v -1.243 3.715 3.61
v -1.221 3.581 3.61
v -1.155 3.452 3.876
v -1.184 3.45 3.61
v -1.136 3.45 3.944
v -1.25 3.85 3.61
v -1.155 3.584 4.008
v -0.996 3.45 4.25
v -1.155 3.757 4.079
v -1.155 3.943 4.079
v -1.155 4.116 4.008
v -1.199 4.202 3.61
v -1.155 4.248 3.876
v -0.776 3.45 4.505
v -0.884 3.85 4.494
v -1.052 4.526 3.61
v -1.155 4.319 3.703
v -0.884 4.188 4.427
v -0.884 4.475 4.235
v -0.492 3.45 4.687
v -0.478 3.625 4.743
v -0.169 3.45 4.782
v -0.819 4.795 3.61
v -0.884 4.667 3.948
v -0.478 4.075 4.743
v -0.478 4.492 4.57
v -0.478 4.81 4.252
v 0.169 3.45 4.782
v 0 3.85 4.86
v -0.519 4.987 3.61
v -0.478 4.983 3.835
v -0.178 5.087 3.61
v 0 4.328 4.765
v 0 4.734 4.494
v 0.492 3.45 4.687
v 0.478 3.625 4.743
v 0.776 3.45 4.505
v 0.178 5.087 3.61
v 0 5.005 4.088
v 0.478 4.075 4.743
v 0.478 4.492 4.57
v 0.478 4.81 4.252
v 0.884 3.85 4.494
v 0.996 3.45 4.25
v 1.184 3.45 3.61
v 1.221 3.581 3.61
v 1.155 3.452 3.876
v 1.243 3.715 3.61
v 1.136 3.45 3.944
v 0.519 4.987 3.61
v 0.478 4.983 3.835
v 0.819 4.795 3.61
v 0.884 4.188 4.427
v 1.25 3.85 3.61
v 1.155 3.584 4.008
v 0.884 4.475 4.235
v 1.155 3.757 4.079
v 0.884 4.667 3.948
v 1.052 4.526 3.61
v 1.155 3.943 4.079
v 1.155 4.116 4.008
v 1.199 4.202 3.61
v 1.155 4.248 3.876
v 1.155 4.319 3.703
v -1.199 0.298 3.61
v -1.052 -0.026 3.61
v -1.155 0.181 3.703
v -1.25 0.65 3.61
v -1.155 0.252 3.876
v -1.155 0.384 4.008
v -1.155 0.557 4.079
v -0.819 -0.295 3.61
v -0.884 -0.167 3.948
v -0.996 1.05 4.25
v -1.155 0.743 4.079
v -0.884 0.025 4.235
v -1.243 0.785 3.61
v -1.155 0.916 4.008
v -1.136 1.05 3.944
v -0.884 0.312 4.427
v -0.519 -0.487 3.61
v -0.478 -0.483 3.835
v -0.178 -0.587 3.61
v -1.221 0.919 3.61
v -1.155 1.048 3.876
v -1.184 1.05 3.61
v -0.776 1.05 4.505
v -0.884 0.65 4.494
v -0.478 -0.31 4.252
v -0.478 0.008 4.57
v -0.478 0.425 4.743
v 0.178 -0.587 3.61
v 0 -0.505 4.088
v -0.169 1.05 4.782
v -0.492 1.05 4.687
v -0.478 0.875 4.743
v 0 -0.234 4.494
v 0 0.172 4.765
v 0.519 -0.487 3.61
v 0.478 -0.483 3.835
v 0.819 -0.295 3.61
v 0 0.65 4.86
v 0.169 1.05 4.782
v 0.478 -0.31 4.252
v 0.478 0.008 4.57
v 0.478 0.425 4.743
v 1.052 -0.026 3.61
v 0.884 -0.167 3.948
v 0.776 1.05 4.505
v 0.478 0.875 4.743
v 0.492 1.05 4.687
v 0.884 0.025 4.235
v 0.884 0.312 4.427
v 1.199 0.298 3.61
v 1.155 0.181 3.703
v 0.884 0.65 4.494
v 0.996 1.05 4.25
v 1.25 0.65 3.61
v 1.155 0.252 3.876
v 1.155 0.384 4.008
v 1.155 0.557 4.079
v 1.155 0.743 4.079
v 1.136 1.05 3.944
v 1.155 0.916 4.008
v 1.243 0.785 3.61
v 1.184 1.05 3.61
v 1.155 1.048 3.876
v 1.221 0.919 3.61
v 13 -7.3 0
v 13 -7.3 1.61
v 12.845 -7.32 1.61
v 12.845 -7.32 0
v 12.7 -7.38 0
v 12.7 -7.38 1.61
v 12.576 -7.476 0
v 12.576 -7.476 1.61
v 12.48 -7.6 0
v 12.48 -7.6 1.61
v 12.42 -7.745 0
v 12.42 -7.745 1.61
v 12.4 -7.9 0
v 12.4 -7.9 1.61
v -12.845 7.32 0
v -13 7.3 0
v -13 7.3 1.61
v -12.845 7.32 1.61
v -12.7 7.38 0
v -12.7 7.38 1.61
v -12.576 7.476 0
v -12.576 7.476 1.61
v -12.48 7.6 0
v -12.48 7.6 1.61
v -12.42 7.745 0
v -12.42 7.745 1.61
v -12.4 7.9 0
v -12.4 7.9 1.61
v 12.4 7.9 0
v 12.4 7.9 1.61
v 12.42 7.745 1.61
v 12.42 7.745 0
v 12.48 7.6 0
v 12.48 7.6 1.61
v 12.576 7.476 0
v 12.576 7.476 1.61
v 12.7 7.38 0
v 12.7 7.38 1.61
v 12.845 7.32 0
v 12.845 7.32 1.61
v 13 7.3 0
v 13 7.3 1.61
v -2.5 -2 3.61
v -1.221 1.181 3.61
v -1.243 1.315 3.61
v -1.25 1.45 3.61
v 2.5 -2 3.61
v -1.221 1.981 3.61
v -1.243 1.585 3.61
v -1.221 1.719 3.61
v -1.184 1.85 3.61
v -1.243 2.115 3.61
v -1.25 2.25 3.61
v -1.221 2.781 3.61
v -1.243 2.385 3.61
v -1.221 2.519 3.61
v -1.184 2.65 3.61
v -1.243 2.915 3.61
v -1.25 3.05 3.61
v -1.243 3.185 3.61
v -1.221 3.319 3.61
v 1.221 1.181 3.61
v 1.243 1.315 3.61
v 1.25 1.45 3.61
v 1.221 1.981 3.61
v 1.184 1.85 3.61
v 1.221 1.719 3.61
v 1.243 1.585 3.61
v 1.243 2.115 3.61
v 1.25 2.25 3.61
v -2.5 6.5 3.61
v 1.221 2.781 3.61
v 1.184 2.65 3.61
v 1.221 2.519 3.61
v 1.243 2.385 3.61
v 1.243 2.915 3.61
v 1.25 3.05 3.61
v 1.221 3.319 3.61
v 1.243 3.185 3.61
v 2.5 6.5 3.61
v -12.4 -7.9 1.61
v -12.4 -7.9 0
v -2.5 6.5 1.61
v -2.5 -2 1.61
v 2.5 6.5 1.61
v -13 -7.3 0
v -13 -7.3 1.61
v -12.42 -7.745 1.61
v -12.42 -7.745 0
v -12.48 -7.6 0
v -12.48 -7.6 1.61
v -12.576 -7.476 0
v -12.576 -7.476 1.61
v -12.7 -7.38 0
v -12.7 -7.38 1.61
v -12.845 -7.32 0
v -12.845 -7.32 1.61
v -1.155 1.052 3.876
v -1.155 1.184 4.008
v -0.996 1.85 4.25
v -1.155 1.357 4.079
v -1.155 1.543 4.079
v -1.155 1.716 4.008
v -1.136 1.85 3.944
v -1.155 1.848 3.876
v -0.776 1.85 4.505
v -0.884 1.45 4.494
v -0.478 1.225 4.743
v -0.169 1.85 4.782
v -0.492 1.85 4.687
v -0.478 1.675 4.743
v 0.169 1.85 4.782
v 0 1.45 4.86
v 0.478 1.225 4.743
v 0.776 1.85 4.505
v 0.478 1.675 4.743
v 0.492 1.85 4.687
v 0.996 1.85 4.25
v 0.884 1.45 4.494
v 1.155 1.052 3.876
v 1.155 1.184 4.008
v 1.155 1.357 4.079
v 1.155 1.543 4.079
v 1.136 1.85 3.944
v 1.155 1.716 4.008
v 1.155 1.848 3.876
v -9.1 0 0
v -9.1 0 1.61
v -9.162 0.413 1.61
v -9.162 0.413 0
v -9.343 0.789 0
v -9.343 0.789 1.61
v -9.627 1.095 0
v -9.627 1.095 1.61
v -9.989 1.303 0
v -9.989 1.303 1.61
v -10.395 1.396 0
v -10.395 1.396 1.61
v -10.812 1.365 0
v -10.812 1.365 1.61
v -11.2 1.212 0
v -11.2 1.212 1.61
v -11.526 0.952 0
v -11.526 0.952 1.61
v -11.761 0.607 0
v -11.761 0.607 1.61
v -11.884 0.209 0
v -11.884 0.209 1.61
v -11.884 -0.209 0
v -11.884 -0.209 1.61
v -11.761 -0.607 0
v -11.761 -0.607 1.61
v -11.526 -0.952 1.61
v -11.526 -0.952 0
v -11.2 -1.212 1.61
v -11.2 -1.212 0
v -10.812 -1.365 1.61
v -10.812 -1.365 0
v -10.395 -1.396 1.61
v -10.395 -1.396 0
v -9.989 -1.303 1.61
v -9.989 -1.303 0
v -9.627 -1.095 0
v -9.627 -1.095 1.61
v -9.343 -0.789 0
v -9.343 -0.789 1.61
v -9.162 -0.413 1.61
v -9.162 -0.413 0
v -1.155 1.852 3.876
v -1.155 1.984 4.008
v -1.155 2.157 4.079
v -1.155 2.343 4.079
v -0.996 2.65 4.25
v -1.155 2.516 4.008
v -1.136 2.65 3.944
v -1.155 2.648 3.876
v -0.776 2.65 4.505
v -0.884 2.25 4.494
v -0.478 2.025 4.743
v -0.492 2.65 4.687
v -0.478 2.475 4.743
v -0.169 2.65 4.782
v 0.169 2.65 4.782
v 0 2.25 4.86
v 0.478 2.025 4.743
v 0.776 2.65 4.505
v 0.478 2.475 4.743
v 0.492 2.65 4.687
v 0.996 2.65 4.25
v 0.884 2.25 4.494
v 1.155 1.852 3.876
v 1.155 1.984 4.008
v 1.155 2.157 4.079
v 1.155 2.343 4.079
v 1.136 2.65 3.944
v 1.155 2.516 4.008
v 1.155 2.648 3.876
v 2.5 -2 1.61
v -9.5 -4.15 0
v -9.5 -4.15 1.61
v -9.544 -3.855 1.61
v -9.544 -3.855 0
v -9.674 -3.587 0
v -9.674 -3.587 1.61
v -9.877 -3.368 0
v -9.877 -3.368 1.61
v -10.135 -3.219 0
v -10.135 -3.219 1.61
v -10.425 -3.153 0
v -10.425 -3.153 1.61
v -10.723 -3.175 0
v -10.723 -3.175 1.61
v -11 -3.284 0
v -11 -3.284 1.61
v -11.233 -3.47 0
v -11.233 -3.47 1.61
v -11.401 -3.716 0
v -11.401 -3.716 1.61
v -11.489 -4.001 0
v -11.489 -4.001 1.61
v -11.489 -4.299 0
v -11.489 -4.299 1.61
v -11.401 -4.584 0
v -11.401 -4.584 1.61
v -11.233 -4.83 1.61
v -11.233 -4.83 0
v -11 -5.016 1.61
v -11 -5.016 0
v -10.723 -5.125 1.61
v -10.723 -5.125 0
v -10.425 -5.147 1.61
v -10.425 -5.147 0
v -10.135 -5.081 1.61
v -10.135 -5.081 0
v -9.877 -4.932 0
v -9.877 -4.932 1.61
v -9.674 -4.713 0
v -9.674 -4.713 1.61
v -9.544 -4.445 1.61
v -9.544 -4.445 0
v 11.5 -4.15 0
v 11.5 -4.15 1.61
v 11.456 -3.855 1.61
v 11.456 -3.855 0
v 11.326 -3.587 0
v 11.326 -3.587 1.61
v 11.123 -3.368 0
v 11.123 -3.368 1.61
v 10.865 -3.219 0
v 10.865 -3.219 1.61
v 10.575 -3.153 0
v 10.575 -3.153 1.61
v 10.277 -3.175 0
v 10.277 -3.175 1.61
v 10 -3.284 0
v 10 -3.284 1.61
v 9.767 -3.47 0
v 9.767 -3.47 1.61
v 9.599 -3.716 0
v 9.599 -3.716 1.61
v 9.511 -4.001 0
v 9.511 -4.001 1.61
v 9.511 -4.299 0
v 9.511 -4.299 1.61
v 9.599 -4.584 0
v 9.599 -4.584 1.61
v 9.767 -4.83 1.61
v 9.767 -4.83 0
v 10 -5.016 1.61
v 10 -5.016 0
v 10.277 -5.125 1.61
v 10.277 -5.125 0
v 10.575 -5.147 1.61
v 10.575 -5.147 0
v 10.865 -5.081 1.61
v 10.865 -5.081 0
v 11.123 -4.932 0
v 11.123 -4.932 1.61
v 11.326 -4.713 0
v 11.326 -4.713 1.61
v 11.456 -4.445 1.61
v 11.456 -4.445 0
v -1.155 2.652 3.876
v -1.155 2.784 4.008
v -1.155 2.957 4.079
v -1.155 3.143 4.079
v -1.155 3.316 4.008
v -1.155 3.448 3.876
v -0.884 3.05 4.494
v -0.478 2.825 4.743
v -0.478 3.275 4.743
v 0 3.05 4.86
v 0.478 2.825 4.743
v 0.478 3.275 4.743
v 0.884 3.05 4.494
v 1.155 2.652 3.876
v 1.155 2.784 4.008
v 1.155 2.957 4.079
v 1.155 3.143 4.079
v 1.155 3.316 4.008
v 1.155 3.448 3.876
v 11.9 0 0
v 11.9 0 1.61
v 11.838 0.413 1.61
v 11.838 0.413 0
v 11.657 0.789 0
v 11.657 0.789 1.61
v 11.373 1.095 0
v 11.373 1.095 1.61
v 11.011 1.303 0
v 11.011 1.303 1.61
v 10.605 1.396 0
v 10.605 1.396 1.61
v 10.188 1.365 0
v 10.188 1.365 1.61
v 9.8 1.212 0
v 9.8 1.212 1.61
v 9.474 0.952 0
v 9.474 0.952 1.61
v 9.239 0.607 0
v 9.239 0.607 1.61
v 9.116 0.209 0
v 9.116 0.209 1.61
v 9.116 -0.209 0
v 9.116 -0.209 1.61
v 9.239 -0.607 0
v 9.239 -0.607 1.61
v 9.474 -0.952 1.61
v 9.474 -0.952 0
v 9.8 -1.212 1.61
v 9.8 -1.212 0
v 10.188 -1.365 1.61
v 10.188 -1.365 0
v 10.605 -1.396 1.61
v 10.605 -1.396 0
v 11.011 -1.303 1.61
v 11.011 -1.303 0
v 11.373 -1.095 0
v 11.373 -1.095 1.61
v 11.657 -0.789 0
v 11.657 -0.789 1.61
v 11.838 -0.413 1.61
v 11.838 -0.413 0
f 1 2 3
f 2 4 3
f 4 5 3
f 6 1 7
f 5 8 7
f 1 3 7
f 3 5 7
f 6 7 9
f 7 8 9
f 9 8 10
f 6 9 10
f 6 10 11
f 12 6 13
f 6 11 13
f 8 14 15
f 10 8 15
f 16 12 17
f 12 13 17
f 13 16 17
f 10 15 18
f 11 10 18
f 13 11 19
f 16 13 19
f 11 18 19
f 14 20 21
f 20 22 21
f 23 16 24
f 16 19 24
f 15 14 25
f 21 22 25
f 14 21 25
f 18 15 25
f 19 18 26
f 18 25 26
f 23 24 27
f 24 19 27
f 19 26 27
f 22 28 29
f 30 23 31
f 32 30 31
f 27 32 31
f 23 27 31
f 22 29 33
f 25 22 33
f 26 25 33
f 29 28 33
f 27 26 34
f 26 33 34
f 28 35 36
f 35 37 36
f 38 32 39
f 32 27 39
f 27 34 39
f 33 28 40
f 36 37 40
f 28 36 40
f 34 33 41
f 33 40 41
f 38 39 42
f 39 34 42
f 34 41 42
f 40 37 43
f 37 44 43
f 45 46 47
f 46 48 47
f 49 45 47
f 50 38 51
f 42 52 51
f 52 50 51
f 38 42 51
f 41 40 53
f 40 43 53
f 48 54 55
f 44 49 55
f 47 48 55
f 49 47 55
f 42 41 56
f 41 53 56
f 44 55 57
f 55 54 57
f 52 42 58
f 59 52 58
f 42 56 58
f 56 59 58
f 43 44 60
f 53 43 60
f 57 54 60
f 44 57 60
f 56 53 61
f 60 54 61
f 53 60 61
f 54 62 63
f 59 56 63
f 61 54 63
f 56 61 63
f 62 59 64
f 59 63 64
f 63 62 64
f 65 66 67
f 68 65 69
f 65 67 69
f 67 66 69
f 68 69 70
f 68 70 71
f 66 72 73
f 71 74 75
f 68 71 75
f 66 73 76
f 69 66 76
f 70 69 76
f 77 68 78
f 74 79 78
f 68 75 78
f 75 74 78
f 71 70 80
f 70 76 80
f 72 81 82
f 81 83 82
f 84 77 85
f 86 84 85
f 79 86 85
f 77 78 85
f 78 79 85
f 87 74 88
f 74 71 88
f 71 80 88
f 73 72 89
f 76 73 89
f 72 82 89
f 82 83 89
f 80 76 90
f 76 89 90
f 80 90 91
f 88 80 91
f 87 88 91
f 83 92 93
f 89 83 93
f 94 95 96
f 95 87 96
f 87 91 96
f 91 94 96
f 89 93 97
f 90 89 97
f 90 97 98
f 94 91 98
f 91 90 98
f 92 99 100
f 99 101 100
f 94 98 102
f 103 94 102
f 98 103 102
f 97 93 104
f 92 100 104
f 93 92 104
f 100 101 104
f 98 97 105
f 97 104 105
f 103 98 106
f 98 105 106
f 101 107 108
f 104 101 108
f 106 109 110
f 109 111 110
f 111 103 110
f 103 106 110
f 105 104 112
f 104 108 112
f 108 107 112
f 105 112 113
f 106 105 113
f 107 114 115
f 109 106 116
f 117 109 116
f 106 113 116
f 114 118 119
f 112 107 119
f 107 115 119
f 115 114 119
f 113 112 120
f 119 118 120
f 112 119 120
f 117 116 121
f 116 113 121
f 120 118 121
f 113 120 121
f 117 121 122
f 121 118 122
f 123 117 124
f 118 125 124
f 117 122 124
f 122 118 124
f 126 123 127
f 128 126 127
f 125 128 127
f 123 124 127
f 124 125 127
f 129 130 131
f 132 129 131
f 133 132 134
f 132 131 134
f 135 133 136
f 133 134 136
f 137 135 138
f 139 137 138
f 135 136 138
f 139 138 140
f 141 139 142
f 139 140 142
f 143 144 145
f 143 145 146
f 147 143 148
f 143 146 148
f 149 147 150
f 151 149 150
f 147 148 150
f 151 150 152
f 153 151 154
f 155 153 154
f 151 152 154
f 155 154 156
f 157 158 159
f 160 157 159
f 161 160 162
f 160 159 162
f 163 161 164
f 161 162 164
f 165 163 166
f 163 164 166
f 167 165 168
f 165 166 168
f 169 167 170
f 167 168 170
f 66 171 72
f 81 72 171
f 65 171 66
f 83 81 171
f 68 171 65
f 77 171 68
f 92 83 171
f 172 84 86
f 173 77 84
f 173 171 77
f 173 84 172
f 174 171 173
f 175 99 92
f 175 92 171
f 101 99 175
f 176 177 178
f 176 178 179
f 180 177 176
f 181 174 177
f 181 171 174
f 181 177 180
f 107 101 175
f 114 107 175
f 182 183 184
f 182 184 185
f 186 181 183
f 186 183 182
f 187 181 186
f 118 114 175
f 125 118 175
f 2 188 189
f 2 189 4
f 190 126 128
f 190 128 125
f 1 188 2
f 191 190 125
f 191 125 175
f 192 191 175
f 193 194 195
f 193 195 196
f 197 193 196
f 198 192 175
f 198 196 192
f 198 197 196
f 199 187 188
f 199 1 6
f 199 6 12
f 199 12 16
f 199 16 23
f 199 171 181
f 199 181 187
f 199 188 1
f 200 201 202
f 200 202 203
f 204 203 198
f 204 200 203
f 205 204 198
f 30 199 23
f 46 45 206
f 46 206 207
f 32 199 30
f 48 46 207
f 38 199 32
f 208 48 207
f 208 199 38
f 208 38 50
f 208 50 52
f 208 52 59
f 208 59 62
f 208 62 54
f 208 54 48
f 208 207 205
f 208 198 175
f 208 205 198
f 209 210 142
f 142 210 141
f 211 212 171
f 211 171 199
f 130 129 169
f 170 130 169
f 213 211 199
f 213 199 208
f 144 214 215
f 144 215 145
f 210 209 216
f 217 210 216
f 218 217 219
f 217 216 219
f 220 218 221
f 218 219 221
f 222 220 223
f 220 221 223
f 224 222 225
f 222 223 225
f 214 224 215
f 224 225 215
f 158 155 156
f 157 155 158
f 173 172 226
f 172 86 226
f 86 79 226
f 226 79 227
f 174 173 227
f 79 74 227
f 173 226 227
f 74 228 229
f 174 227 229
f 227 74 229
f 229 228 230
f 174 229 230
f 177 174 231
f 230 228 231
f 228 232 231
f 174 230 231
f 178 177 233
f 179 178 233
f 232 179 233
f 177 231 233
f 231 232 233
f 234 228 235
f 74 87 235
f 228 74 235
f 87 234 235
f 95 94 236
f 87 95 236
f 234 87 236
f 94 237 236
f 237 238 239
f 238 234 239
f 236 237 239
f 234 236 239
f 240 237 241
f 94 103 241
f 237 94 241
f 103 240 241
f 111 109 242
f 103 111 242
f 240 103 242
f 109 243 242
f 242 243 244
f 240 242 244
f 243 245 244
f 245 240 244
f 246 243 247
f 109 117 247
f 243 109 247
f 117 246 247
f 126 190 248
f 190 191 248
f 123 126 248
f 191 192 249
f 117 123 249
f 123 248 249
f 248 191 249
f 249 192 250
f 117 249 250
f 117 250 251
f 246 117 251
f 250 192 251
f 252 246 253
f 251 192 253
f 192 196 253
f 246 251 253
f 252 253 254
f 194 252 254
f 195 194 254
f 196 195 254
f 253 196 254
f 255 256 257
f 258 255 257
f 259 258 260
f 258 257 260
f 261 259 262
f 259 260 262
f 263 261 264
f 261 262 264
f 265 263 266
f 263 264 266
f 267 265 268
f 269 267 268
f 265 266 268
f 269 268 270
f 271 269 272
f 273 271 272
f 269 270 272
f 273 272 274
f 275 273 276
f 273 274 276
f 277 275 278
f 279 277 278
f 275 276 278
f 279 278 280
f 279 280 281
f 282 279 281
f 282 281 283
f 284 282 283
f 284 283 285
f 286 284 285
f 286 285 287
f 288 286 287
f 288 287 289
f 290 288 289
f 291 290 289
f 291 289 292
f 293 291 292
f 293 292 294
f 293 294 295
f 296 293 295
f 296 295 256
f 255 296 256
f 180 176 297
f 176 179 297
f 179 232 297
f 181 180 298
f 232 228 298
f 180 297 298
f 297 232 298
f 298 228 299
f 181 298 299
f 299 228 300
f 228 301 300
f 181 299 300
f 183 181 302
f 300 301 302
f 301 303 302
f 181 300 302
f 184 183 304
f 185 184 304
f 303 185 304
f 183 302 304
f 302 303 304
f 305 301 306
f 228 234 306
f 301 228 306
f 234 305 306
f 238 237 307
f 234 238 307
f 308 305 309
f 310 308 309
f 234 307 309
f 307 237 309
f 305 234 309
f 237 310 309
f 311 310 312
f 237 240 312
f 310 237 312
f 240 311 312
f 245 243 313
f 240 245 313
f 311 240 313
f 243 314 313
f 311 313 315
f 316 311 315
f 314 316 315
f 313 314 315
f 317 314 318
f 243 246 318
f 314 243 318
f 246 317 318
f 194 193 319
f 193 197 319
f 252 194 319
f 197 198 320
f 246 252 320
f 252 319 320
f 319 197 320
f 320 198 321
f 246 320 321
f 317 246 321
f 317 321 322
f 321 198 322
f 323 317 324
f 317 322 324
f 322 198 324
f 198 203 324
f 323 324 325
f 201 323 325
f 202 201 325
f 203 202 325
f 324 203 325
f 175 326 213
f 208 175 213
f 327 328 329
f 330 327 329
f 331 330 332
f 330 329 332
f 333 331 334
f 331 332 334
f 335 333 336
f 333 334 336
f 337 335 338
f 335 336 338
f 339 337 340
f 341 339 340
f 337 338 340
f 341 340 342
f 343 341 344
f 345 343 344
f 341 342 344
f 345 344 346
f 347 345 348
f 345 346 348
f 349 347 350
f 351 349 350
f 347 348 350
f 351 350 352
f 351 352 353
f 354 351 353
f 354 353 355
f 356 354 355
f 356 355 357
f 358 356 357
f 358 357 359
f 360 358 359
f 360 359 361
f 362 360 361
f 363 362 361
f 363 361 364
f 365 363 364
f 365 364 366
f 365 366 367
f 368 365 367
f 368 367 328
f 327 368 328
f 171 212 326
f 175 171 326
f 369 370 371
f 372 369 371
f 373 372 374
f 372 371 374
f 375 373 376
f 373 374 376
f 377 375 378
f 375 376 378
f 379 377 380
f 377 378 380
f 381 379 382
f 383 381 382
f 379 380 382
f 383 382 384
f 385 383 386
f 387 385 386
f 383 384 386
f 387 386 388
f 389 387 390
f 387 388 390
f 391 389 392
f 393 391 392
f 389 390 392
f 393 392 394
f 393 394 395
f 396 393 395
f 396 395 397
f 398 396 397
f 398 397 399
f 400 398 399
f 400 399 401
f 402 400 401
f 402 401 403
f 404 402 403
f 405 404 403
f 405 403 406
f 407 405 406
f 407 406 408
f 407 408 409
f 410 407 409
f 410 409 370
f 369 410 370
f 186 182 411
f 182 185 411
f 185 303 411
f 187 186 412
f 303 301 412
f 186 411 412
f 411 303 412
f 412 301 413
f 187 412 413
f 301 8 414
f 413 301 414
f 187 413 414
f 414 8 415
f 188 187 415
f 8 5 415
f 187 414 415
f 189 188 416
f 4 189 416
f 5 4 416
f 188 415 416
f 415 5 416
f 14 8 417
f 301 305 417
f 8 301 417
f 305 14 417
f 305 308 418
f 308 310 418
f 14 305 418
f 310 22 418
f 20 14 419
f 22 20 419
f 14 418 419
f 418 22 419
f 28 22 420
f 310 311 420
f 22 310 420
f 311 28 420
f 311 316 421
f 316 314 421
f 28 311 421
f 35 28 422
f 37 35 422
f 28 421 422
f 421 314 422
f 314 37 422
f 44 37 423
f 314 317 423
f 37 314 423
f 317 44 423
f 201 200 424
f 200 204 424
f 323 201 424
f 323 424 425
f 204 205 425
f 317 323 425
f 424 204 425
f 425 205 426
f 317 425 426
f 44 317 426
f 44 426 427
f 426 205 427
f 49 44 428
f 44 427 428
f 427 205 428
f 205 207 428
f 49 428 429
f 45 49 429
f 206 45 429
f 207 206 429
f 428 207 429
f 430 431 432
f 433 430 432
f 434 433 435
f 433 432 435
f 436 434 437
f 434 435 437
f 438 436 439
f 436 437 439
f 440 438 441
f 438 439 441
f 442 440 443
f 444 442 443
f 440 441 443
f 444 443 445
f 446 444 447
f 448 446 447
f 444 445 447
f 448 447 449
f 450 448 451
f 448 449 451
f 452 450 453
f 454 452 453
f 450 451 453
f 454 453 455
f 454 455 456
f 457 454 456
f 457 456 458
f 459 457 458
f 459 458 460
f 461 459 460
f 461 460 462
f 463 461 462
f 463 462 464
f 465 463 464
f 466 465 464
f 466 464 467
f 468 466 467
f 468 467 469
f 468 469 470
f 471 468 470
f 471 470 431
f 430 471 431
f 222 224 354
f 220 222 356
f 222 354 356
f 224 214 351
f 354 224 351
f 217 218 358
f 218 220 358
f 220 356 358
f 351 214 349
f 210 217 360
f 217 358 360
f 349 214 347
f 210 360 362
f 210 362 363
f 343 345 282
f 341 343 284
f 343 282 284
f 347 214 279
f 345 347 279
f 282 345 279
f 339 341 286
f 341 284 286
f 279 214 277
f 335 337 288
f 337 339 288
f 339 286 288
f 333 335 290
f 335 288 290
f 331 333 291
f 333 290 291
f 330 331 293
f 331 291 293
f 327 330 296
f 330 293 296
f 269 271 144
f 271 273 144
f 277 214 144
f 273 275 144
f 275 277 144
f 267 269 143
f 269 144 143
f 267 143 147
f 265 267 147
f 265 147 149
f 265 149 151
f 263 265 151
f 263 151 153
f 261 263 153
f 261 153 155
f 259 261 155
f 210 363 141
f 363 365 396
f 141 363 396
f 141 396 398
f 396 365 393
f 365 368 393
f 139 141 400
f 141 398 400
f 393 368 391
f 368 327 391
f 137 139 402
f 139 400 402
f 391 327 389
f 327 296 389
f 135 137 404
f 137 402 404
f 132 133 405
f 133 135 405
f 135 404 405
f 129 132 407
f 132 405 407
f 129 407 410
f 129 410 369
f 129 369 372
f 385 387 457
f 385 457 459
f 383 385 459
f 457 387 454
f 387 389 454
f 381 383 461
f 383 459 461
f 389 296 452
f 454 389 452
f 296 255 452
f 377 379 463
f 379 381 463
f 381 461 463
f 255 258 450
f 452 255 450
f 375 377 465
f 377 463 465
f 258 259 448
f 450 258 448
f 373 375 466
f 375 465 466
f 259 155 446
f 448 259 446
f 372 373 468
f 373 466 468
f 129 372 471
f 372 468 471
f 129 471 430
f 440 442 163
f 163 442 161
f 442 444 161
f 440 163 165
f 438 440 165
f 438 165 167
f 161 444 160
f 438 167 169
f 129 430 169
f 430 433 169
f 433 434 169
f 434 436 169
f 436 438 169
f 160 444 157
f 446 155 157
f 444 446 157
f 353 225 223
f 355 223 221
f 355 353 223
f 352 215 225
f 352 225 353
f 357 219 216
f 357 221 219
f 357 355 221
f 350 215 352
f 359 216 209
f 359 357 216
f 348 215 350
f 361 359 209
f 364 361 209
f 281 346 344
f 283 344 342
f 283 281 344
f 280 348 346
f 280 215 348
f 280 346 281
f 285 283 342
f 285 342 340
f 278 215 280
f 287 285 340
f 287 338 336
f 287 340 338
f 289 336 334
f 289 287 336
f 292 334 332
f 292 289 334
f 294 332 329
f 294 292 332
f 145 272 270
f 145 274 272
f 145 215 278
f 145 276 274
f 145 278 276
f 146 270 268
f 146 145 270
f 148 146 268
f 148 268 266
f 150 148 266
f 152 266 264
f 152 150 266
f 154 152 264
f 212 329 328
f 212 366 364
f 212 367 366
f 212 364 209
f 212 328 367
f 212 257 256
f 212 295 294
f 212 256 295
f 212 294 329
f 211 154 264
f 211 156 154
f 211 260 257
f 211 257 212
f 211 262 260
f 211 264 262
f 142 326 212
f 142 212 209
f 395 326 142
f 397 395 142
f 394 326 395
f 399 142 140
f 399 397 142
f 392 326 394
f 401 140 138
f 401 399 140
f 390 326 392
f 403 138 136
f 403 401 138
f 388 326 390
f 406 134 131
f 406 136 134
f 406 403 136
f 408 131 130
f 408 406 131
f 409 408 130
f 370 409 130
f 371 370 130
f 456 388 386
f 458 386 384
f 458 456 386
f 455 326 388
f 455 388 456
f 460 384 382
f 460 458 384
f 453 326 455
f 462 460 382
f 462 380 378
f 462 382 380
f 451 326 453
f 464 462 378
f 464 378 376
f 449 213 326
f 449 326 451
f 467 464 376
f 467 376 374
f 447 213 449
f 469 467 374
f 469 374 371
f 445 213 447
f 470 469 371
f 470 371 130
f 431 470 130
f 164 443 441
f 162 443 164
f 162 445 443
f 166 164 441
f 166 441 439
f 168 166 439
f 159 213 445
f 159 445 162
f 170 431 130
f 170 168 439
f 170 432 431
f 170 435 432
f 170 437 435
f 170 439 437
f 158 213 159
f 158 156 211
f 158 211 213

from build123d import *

# Parameters (mm, degrees)
SKETCH1_W           = 26
SKETCH1_H           = 15.8
BOSS_EXTRUDE1_DEPTH = 1.61
SKETCH2_R           = 0.6
CUT_EXTRUDE1_DEPTH  = 1.61
SKETCH3_R           = 1.4
SKETCH3_R_2         = 1
CUT_EXTRUDE2_DEPTH  = 11.61
SKETCH4_W           = 5
SKETCH4_H           = 8.5
BOSS_EXTRUDE2_DEPTH = 2
LPATTERN1_COUNT     = 3
LPATTERN1_PITCH     = 0.8
LPATTERN1_COL_COUNT = 3
LPATTERN1_COL_PITCH = 0.8


with BuildPart() as part:
    # Sketch1 → Boss-Extrude1 (new body)
    with BuildSketch(Plane.XY):
        Rectangle(SKETCH1_W, SKETCH1_H)
    extrude(amount=BOSS_EXTRUDE1_DEPTH)

    # Sketch2 → Cut-Extrude1 (cut)
    with BuildSketch(Plane.XY.offset(1.61)):
        with Locations((-13, 7.9)):
            Circle(SKETCH2_R)
        with Locations((-13, -7.9)):
            Circle(SKETCH2_R)
        with Locations((13, -7.9)):
            Circle(SKETCH2_R)
        with Locations((13, 7.9)):
            Circle(SKETCH2_R)
    extrude(amount=-CUT_EXTRUDE1_DEPTH, mode=Mode.SUBTRACT)

    # Sketch3 → Cut-Extrude2 (cut)
    with BuildSketch(Plane.XY.offset(1.61)):
        with Locations((-10.5, 0)):
            Circle(SKETCH3_R)
        with Locations((10.5, 0)):
            Circle(SKETCH3_R)
        with Locations((-10.5, -4.15)):
            Circle(SKETCH3_R_2)
        with Locations((10.5, -4.15)):
            Circle(SKETCH3_R_2)
    extrude(amount=-CUT_EXTRUDE2_DEPTH, mode=Mode.SUBTRACT)

    # Sketch4 → Boss-Extrude2 (add)
    with BuildSketch(Plane.XY.offset(1.61)):
        with Locations((0, 2.25)):
            Rectangle(SKETCH4_W, SKETCH4_H)
    extrude(amount=BOSS_EXTRUDE2_DEPTH)

    # Sketch5 → Revolve1 (revolve)
    with BuildSketch(Plane.XY.offset(3.61)):
        with BuildLine():
            Line((1.25, 2.25), (-1.25, 2.25))
            ThreePointArc((-1.25, 2.25), (0, 3.5), (1.25, 2.25))
        make_face()
    revolve1 = revolve(axis=Axis((1.25, 2.25, 3.61), (-1, 0, 0)))

    # LPattern1: Revolve1 ×3
    with Locations(*[(0, -i * LPATTERN1_PITCH, 0) for i in range(1, LPATTERN1_COUNT)]):
        add(revolve1)

    # LPattern1 col: Revolve1 ×3
    with Locations(*[(0, i * LPATTERN1_COL_PITCH, 0) for i in range(1, LPATTERN1_COL_COUNT)]):
        add(revolve1)


solid = part.part
